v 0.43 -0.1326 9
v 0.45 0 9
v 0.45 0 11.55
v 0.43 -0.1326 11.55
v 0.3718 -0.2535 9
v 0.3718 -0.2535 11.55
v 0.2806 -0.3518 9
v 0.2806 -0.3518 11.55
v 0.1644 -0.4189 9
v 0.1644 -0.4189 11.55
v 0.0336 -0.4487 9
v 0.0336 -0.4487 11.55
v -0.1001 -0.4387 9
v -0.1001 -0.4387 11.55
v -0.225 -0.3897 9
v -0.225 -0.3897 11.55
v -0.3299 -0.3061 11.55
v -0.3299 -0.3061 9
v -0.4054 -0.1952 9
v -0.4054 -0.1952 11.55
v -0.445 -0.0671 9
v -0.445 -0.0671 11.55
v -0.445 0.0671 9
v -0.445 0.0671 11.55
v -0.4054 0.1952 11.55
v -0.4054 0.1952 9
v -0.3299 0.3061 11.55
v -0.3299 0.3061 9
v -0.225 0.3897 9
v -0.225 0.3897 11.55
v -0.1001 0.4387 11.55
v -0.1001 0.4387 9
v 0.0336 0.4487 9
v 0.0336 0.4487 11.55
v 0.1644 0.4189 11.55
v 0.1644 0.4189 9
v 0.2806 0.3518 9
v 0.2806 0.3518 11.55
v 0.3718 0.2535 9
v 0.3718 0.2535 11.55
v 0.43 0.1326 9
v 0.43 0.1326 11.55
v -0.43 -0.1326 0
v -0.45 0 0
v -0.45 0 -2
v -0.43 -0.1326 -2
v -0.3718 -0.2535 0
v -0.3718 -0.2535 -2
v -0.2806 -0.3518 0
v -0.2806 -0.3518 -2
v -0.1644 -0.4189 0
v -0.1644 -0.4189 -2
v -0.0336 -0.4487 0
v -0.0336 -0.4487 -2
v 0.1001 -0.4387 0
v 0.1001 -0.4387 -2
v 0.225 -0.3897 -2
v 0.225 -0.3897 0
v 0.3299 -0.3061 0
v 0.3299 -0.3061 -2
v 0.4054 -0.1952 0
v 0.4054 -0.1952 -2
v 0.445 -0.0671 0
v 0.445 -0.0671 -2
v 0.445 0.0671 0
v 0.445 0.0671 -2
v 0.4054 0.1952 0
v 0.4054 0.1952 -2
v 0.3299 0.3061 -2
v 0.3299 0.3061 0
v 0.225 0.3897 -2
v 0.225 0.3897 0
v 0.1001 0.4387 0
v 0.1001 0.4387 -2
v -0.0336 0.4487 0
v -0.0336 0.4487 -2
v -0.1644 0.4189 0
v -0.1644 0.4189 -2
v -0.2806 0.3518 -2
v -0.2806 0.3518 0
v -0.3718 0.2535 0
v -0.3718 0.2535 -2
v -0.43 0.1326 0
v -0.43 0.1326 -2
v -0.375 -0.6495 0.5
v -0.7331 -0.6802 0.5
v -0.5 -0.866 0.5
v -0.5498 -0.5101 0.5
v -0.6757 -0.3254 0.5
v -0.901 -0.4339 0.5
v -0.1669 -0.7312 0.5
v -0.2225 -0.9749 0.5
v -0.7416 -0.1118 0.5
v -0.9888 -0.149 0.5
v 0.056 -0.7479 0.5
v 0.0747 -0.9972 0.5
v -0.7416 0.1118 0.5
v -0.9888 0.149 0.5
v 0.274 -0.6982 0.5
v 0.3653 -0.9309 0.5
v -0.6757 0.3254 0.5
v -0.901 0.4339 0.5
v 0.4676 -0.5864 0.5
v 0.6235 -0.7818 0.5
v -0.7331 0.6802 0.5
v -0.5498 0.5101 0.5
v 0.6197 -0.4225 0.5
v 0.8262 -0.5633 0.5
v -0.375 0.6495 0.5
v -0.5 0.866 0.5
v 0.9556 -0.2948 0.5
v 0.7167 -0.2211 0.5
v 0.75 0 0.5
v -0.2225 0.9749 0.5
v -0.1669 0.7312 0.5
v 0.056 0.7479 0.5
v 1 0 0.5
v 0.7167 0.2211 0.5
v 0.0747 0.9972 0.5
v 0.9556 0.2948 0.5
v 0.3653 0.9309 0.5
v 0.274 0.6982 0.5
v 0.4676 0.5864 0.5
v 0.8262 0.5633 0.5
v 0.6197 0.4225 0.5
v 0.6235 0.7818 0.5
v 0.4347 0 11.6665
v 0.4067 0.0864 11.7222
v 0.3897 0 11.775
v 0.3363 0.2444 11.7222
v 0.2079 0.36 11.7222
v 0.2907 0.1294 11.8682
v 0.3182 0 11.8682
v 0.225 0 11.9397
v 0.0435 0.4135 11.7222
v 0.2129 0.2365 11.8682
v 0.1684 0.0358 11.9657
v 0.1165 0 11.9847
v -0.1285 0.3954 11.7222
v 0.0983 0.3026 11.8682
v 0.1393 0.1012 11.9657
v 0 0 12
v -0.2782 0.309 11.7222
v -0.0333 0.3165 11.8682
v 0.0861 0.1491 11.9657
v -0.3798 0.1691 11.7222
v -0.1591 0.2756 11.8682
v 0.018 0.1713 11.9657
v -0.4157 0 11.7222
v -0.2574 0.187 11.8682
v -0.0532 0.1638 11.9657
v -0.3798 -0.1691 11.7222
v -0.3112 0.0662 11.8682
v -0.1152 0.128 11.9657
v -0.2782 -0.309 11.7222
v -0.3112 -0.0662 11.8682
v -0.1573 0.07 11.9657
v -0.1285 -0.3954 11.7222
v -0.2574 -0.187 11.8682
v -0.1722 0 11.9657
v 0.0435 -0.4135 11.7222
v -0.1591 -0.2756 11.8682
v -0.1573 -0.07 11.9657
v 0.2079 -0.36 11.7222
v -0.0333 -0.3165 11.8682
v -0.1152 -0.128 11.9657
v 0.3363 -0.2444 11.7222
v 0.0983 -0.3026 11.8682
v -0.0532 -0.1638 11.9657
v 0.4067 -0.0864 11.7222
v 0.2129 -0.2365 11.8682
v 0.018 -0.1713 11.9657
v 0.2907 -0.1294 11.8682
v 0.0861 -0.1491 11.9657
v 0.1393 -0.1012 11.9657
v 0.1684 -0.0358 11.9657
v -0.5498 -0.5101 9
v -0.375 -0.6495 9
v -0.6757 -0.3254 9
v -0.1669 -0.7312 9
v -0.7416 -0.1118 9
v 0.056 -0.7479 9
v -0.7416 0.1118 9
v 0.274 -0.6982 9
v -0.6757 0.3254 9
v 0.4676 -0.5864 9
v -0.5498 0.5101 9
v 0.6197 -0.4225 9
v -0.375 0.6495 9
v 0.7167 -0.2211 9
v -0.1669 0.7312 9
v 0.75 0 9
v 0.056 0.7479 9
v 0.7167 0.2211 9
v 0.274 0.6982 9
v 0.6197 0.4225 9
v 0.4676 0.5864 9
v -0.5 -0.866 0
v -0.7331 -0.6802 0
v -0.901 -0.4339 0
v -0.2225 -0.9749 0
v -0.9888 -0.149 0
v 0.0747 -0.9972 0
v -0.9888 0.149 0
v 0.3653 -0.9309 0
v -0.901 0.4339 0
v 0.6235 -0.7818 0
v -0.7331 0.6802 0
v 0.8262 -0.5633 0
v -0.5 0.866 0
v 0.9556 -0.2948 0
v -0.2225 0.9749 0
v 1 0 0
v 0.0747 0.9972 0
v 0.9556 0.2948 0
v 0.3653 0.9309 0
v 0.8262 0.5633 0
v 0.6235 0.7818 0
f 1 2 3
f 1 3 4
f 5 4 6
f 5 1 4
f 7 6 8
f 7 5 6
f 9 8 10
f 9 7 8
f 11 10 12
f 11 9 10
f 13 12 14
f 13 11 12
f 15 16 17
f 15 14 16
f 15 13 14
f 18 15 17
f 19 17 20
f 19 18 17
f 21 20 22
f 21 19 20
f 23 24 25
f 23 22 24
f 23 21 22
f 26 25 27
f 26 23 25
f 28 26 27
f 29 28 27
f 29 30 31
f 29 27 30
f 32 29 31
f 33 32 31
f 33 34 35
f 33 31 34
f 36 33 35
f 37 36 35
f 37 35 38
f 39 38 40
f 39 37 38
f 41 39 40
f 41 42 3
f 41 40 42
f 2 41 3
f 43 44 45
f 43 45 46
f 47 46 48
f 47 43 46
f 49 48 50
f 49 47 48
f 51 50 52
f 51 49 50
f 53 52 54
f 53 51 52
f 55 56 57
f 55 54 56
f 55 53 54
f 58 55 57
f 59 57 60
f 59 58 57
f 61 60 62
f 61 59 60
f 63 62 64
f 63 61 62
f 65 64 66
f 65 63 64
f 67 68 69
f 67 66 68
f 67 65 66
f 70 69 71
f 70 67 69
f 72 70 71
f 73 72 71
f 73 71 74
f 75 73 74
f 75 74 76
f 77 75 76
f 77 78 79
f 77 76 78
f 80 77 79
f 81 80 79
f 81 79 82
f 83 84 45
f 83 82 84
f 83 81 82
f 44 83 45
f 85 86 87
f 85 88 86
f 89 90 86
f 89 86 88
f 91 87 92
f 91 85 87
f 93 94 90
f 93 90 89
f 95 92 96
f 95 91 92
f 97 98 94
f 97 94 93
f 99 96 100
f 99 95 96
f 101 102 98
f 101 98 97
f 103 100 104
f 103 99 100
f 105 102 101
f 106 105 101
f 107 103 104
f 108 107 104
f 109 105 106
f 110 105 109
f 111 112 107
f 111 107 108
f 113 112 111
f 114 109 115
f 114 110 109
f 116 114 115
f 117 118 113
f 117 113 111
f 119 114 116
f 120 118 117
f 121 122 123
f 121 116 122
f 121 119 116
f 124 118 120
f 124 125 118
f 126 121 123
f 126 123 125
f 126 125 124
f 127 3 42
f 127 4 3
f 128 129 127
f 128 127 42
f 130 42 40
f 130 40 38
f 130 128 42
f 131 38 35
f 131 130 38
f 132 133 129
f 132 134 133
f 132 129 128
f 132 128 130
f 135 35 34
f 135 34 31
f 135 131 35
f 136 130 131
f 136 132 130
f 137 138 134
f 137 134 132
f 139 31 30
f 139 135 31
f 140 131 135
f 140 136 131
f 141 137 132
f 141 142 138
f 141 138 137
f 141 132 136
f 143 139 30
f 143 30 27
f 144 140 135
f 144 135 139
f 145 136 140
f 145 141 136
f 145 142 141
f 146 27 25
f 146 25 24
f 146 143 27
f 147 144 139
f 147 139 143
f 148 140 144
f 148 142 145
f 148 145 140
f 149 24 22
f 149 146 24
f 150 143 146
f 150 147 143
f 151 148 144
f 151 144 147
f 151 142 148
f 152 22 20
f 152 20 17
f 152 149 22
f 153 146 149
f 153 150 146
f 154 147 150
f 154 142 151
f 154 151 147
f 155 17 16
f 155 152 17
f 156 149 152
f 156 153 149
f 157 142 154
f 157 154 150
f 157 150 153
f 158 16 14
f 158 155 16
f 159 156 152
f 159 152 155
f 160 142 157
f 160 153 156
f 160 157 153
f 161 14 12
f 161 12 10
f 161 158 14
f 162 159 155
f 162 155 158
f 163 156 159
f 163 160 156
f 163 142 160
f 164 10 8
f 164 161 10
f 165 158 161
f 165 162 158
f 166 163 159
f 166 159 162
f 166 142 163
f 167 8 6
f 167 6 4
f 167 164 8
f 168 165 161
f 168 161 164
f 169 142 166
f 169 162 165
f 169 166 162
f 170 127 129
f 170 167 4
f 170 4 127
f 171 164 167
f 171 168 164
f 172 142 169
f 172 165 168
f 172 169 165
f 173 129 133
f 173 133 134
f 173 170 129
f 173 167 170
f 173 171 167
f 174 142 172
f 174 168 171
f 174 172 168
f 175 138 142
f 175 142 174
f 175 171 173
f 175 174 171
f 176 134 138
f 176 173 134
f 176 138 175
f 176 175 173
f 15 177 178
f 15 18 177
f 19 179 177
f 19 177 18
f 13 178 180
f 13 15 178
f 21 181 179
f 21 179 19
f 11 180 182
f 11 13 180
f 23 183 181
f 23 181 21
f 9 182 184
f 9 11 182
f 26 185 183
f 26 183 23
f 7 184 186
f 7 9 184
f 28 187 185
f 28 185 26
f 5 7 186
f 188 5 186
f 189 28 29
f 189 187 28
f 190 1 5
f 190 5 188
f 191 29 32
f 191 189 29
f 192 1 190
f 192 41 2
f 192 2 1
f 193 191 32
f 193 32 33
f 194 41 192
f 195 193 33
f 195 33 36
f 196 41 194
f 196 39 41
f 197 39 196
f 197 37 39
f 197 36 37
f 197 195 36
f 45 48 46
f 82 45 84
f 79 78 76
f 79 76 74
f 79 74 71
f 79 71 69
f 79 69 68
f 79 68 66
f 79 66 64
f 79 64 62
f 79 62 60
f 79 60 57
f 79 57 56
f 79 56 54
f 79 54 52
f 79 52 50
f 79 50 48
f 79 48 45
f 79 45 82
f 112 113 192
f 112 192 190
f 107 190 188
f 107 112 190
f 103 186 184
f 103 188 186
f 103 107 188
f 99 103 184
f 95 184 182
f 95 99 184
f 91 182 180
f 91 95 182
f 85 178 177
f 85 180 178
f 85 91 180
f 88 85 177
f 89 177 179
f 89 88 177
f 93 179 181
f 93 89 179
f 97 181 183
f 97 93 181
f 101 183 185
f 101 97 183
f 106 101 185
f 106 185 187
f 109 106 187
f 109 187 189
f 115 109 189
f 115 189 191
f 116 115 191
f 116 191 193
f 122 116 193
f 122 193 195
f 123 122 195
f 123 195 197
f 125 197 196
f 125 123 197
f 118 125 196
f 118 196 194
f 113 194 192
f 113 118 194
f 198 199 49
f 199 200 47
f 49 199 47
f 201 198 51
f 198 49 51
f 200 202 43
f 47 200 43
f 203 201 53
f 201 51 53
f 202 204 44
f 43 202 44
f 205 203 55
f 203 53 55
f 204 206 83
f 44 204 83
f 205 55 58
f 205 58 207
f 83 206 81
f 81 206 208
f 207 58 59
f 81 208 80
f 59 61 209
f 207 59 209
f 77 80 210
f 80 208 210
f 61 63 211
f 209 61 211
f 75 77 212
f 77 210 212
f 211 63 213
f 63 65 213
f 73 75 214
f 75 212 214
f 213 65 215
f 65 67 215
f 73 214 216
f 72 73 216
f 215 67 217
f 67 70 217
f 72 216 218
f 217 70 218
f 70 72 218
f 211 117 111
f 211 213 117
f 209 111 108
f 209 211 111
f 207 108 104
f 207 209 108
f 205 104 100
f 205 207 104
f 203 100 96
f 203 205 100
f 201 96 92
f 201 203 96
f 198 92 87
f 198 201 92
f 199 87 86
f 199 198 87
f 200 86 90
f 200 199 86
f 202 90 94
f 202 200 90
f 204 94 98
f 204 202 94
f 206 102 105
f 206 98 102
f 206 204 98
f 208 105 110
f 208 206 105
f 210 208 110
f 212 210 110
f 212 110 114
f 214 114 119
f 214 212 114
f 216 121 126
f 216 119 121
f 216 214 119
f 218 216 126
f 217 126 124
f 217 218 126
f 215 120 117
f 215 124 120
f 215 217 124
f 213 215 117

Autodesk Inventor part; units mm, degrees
ref_plane "YZ Plane" through (0, 0, 0) normal (1, 0, 0) x (0, 1, 0)
ref_plane "XZ Plane" through (0, 0, 0) normal (0, 1, 0) x (-1, 0, 0)
ref_plane "XY Plane" through (0, 0, 0) normal (0, 0, 1) x (1, 0, 0)
sketch "Skizze1" plane through (0, 0, 0) normal (0, 0, 1) x (1, 0, 0)
  circle A0 centre (0, 0) radius 1
  dimension "d0" = 2
extrude "Extrusion1" add sketch "Skizze1" along normal blind 0.5
sketch "Skizze2" plane through (0, 0, 0.5) normal (0, 0, 1) x (1, 0, 0)
  circle A0 centre (0, 0) radius 0.75
  dimension "d3" = 1.5
extrude "Extrusion2" add sketch "Skizze2" along normal blind 8.5
sketch "Skizze3" plane through (0, 0, 9) normal (0, 0, 1) x (1, 0, 0)
  circle A0 centre (0, 0) radius 0.45
  dimension "d6" = 0.9
extrude "Extrusion3" add sketch "Skizze3" along normal blind 3
fillet "Rundung1" radius 0.45 1 edges at (-0.45, 0, 12)
sketch "Skizze4" plane through (0, 0, 0) normal (0, 0, -1) x (-1, 0, 0)
  circle A0 centre (0, 0) radius 0.45
  dimension "d10" = 0.9
extrude "Extrusion4" add sketch "Skizze4" along normal blind 2
properties part number "PoGo_pin" material "Gold"
